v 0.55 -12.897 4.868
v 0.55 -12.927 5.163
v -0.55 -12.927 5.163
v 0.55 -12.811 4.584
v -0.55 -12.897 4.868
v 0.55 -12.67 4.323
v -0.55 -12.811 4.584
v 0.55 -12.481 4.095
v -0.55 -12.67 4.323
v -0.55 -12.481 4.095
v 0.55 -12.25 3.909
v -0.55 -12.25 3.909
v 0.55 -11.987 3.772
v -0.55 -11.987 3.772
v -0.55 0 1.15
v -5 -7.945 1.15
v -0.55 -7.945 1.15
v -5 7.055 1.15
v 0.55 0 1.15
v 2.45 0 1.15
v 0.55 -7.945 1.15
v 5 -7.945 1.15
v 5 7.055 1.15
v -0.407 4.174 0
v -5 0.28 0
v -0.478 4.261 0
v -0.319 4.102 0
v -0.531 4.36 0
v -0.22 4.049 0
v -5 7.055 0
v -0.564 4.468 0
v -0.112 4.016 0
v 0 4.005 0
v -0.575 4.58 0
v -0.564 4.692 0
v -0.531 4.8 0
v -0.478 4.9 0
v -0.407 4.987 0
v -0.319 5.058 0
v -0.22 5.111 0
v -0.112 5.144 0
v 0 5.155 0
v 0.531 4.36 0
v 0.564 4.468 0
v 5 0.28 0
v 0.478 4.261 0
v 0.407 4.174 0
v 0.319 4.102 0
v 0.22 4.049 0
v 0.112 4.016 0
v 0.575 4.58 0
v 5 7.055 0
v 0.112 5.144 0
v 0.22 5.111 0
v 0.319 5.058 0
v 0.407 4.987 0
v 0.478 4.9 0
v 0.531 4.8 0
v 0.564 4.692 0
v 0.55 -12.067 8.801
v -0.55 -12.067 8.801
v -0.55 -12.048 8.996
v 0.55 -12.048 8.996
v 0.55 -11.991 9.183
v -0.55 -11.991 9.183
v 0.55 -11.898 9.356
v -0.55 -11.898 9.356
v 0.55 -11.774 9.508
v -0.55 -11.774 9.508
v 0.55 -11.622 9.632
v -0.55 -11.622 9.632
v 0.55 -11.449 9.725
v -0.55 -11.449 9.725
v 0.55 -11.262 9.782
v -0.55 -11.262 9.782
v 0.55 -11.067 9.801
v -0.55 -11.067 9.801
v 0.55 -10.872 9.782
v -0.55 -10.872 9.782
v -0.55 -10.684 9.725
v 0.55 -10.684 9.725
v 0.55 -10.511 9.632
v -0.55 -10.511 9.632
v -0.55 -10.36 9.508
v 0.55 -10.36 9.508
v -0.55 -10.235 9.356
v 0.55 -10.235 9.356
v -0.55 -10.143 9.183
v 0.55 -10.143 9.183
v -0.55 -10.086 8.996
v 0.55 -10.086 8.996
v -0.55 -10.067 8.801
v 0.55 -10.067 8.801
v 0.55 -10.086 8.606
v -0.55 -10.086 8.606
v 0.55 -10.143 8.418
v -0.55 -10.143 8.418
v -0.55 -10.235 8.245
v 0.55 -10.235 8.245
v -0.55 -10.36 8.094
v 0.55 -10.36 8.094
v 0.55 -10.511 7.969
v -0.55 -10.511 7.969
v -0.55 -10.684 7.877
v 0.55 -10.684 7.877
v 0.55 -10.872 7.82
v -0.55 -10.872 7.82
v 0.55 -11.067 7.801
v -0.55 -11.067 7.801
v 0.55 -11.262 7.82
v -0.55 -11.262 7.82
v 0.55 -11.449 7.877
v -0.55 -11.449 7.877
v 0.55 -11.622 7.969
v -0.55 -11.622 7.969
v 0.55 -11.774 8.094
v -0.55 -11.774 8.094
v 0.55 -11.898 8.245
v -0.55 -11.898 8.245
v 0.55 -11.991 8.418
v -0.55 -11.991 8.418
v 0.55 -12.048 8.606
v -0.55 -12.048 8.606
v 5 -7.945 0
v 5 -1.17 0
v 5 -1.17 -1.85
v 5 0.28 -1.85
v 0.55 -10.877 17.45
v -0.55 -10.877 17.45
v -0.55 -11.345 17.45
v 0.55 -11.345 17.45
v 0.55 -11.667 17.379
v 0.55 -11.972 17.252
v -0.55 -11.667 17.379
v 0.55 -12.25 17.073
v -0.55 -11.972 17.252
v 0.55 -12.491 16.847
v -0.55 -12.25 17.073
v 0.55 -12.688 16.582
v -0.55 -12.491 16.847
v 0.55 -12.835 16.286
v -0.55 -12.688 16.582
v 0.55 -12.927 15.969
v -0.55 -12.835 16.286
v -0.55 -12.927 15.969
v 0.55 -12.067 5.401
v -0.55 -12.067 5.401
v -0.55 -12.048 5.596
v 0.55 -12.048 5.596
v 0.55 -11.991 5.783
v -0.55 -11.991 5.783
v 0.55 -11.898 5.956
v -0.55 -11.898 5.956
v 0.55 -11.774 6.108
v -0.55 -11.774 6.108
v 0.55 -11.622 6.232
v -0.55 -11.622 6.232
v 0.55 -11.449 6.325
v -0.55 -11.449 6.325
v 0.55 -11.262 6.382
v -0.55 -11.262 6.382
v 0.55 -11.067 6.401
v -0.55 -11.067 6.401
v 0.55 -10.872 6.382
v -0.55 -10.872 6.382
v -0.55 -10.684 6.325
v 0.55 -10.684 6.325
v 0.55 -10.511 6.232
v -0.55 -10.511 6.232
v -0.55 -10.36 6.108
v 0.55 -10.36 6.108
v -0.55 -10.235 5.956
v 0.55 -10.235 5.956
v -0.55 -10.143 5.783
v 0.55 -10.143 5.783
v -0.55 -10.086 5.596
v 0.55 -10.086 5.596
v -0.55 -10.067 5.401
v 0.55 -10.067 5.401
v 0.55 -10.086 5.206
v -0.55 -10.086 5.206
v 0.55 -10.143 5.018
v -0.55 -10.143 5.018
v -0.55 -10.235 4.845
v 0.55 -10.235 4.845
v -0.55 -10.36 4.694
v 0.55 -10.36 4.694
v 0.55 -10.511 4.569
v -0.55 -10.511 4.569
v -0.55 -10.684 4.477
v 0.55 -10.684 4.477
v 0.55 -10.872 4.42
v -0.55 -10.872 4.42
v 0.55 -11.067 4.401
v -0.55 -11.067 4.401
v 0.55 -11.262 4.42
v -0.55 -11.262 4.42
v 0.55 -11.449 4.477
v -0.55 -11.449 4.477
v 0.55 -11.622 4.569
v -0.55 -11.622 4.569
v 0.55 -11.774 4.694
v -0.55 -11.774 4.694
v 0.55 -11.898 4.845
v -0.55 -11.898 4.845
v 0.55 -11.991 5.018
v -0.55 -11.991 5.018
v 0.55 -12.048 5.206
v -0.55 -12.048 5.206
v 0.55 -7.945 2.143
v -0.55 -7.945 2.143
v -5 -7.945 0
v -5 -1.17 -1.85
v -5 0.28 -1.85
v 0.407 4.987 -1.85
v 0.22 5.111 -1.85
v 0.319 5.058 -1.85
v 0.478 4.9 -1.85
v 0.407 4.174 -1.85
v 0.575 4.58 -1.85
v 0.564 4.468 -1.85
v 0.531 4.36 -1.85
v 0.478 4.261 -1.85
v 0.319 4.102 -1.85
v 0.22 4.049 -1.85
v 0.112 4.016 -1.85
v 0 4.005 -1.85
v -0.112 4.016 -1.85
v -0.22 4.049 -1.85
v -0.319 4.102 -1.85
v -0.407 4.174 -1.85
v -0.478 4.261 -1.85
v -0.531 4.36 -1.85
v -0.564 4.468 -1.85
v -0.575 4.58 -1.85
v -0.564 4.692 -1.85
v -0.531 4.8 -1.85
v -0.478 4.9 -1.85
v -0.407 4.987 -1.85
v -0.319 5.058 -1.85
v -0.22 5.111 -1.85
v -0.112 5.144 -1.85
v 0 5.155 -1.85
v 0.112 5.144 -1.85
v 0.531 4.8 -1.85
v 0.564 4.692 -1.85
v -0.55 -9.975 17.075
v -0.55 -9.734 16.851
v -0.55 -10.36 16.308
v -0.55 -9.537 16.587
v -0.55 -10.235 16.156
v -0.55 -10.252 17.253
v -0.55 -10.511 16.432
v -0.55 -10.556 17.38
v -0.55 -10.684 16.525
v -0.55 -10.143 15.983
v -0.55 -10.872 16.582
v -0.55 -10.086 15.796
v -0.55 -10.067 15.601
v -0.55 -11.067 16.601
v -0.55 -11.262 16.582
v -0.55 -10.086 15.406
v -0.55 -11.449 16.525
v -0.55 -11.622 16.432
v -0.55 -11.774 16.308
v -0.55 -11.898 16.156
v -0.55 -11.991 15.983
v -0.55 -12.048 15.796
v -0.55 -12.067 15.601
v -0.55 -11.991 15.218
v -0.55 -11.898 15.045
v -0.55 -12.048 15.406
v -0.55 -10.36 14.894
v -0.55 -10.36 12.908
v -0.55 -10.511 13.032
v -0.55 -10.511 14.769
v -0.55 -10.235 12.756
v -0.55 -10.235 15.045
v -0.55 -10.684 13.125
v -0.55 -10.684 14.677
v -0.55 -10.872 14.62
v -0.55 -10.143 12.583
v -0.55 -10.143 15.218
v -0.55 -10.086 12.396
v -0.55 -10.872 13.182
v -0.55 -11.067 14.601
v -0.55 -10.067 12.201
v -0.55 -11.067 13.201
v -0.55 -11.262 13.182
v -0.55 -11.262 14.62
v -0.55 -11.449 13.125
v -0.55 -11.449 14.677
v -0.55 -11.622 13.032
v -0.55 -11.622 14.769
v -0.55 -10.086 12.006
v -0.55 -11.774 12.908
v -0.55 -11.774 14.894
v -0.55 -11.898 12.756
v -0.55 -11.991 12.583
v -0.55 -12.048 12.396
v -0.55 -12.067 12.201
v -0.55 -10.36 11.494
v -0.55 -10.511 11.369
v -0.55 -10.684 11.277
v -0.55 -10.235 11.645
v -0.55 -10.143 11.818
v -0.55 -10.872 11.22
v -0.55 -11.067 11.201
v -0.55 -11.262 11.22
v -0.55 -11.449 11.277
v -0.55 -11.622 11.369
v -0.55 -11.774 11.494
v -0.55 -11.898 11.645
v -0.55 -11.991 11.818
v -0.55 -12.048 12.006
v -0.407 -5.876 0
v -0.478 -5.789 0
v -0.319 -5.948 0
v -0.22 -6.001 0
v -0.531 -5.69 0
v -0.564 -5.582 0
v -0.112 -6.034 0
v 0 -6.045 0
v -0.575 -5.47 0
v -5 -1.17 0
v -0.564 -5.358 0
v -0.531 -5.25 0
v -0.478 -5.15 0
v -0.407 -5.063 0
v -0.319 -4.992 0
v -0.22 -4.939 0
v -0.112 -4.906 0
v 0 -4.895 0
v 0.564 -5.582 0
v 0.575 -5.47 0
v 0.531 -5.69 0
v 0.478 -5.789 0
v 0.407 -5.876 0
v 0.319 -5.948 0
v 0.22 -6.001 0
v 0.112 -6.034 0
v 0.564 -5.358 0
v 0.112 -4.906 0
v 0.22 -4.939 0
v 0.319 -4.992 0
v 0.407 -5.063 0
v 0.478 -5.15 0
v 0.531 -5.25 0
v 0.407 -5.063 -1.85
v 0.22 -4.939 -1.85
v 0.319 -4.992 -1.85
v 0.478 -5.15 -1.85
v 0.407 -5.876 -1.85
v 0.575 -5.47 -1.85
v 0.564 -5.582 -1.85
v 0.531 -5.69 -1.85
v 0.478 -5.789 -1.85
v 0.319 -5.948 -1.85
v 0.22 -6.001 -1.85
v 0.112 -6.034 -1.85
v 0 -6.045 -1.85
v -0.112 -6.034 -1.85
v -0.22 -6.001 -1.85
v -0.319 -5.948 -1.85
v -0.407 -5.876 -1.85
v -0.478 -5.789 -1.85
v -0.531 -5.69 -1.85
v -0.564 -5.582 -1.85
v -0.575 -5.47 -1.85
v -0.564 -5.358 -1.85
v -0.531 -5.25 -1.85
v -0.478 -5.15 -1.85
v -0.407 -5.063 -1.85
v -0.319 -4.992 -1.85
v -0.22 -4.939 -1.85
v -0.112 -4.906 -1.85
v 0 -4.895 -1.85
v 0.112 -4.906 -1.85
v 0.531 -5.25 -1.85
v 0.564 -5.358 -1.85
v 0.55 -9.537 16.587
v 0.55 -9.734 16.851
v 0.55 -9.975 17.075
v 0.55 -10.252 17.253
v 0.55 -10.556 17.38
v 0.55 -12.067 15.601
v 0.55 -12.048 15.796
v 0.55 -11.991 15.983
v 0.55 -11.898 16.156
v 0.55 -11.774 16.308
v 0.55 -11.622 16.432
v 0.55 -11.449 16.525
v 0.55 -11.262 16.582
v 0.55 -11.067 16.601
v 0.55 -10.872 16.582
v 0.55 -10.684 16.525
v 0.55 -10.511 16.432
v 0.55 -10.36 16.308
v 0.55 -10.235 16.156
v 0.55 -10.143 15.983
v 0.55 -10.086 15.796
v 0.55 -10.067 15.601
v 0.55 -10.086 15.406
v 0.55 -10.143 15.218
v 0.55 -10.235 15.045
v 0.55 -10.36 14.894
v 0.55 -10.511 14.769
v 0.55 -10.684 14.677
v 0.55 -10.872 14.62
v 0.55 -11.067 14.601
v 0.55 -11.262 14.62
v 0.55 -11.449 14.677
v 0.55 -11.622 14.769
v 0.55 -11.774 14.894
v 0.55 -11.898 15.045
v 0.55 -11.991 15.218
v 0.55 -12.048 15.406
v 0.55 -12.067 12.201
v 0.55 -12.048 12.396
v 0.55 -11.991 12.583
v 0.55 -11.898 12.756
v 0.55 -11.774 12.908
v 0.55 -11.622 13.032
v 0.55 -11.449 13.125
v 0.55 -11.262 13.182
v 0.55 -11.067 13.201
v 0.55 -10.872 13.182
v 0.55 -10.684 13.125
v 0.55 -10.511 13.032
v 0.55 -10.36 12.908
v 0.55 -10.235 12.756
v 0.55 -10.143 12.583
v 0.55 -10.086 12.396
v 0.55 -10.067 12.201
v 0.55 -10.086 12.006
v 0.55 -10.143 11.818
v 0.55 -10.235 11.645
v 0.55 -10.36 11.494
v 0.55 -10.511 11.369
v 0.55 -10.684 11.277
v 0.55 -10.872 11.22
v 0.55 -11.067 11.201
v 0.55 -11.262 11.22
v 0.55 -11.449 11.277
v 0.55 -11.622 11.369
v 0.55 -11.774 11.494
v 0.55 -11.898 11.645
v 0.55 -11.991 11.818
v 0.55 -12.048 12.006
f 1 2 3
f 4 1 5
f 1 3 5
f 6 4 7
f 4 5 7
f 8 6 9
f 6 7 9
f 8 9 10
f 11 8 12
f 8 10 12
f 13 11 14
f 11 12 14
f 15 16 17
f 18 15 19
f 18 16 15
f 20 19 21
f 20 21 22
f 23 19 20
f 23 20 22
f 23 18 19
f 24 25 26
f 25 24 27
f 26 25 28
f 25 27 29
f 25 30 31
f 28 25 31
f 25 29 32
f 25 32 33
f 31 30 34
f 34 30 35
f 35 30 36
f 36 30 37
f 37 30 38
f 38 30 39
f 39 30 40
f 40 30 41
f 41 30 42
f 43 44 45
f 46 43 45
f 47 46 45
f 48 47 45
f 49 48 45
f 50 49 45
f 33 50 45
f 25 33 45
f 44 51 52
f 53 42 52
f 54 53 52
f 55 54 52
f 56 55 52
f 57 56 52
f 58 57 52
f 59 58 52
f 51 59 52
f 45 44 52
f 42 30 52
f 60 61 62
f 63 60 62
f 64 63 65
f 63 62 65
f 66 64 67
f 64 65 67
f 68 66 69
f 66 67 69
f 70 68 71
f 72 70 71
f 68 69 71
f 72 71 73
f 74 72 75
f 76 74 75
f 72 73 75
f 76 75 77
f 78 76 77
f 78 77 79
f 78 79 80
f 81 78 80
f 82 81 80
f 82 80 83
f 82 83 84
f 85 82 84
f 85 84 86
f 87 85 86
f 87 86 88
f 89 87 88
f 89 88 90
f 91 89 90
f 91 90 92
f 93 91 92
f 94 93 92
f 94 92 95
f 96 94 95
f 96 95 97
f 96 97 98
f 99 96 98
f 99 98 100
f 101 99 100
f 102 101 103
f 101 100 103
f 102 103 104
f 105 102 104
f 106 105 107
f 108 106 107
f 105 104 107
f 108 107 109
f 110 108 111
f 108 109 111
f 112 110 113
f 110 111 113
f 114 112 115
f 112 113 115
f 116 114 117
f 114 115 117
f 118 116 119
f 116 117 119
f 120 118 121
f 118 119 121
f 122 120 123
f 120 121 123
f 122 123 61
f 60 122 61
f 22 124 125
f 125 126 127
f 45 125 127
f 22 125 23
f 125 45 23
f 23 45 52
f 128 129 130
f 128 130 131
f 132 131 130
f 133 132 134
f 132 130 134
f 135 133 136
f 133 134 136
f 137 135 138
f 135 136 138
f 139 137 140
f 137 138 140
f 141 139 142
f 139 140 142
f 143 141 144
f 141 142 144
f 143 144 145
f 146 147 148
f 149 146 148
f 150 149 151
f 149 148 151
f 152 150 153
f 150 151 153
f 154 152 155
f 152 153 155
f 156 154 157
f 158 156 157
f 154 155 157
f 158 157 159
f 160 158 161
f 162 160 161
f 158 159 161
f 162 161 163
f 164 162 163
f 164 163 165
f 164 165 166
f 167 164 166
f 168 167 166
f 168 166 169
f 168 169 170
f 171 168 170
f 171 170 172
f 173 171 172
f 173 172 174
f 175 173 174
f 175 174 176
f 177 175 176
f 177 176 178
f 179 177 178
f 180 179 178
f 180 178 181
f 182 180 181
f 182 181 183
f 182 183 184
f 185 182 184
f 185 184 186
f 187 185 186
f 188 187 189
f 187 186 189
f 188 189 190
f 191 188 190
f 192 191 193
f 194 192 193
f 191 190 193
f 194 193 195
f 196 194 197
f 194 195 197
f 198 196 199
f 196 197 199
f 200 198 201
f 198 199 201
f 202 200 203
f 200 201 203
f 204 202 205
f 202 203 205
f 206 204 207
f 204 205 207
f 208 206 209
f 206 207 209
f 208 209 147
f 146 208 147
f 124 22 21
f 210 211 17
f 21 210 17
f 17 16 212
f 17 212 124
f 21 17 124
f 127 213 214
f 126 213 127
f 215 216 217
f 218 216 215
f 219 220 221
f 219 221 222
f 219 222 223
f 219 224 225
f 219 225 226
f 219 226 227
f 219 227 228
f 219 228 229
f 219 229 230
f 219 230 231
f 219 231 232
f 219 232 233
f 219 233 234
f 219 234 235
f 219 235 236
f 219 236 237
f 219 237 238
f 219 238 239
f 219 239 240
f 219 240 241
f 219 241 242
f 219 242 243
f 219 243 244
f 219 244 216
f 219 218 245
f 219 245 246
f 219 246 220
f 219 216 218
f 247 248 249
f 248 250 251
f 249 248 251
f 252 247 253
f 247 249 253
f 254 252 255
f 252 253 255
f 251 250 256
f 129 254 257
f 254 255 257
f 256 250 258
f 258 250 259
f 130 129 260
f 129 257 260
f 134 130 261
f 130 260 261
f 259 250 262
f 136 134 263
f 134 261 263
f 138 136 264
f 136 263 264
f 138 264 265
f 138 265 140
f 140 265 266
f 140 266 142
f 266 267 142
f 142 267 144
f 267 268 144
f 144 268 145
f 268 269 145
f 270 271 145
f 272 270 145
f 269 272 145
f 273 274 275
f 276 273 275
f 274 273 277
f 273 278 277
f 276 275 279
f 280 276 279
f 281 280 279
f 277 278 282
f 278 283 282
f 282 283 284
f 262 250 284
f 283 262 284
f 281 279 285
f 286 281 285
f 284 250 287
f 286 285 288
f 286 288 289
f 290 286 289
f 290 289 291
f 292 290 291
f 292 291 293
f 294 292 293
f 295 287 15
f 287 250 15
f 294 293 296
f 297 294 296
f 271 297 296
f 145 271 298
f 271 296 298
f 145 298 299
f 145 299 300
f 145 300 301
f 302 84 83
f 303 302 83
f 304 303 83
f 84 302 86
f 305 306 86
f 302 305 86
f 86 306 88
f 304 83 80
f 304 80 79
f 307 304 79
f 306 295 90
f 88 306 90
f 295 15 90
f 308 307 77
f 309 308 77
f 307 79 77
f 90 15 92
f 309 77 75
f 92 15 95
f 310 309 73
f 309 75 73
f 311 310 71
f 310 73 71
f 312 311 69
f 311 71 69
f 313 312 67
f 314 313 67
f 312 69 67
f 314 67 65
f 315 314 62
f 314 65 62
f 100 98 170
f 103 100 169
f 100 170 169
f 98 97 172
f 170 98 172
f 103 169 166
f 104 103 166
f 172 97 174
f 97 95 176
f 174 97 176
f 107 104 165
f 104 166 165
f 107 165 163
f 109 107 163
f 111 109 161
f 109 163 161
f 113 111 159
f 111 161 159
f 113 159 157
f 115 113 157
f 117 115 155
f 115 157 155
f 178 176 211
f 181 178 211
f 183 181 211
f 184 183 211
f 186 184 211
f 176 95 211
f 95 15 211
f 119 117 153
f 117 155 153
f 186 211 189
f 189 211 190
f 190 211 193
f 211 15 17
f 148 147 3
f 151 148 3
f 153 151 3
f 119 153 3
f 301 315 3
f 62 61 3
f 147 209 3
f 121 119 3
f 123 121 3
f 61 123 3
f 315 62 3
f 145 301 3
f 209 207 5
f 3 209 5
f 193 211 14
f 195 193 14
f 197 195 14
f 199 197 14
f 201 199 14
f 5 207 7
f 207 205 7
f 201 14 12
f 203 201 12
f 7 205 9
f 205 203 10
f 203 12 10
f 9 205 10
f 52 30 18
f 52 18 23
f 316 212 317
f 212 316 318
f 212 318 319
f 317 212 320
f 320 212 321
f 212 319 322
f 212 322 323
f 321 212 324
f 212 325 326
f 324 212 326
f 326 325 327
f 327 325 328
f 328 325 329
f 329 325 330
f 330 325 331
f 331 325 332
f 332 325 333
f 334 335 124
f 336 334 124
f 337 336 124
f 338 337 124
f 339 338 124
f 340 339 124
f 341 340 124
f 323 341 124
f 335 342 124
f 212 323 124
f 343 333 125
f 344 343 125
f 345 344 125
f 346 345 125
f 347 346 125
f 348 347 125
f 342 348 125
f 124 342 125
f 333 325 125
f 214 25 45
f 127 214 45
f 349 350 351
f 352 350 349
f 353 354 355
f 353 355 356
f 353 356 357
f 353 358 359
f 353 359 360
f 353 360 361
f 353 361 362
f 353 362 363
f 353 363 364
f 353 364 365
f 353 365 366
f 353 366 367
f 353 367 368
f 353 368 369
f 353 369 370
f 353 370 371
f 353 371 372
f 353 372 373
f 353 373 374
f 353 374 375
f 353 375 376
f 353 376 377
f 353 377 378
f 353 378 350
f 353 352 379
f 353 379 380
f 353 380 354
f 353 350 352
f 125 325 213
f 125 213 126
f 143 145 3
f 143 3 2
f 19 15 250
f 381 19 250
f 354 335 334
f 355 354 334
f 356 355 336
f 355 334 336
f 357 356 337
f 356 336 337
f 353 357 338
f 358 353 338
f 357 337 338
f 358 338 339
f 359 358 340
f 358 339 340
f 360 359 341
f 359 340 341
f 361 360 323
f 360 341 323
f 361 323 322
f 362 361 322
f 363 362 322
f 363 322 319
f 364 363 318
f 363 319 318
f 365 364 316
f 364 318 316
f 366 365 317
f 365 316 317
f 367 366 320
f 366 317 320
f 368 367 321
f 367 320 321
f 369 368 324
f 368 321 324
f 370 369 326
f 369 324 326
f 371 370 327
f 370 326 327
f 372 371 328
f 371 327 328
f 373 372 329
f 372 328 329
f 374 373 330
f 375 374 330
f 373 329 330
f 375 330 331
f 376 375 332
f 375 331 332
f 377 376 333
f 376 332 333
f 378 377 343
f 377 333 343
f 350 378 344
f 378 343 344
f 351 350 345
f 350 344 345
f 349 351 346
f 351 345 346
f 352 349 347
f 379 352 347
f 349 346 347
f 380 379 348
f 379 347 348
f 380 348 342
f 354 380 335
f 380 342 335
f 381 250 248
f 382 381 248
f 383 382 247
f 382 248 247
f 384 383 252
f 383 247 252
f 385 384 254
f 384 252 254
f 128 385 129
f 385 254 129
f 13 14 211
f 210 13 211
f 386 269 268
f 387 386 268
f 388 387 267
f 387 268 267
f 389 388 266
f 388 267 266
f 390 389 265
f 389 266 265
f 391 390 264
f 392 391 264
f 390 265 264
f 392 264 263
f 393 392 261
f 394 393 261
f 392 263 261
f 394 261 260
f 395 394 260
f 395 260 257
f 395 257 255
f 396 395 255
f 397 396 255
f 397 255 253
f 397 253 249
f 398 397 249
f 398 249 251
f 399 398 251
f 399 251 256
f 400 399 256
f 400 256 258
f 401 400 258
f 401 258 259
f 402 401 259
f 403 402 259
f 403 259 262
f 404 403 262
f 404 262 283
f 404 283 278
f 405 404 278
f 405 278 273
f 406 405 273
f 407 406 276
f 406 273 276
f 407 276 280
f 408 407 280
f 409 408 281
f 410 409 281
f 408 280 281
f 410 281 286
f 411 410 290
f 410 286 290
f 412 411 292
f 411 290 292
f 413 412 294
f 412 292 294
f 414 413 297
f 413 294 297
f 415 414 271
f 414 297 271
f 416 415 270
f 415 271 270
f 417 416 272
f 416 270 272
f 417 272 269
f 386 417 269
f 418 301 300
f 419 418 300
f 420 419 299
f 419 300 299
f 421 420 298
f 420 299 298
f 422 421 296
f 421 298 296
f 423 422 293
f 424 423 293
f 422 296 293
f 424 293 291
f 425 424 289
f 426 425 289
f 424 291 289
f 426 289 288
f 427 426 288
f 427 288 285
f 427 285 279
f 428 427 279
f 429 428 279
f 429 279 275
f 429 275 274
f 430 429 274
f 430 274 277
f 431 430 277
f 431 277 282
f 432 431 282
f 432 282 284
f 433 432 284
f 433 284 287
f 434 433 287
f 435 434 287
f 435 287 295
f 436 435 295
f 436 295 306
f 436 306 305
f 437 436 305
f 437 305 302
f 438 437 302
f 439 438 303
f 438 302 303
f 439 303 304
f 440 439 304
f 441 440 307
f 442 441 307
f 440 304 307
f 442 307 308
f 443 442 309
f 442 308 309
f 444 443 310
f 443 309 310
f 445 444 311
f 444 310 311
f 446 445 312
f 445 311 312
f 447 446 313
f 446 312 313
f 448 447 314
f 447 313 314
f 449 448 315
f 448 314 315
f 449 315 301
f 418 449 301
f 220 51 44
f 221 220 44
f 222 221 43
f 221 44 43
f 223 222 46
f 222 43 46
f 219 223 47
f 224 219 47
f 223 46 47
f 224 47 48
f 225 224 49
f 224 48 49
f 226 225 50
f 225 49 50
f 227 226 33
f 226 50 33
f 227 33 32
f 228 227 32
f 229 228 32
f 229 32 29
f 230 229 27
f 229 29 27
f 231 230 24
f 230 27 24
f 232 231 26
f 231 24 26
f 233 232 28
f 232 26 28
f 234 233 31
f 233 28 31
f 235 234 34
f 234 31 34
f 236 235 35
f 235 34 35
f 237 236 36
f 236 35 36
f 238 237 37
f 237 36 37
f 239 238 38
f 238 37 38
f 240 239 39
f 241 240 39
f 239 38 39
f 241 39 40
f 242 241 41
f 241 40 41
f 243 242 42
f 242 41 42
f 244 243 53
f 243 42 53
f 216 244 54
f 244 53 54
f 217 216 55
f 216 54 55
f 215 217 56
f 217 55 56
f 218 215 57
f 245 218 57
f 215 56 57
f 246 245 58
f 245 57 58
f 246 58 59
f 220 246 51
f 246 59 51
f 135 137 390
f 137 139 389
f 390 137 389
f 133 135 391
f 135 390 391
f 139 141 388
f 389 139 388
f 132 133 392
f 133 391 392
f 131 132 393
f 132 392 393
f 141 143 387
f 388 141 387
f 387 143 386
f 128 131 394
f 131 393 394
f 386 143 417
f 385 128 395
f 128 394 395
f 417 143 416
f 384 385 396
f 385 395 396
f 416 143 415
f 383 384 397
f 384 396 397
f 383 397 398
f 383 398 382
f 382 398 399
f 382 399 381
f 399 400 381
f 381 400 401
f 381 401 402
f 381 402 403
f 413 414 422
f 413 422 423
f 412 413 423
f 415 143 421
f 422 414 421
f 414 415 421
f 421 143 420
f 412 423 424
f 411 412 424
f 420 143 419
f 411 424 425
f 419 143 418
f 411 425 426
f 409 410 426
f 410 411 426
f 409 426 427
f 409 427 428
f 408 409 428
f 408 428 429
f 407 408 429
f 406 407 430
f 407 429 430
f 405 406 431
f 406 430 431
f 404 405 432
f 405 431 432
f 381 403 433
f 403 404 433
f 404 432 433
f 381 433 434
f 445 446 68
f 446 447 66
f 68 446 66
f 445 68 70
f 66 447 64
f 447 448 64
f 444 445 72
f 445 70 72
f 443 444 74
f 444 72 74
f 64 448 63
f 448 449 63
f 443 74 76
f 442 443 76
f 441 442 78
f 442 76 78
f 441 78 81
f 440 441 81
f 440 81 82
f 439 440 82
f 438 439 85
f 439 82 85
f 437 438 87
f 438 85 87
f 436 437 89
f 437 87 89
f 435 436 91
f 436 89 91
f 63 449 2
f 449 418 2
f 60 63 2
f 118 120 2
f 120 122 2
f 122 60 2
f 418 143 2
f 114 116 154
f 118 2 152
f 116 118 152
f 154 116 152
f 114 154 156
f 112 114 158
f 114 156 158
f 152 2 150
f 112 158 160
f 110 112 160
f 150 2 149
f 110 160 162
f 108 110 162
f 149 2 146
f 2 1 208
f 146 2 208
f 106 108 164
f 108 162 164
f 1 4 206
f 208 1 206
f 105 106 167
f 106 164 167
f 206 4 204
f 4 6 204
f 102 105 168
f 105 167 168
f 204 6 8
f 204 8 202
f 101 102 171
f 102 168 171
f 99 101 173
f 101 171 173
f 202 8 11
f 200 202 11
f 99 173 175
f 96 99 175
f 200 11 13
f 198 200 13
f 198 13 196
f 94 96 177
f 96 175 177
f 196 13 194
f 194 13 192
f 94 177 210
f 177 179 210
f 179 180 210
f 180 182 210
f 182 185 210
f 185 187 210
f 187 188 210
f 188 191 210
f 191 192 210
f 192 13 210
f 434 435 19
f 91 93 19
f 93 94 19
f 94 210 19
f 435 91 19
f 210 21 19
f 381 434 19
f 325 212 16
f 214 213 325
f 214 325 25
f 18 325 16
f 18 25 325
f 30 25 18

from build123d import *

# Parameters (mm, degrees)
F0_W     = 10
F0_H     = 15
F1_DEPTH = 1.15
F2_W     = 10
F2_H     = 1.45
F2_R     = 0.575
F3_DEPTH = 1.85
F5_W     = 1.0999371812
F5_H     = 4.9819686796
F5_H_2   = 7.9447921516
F6_DEPTH = 16.3
F7_R     = 1
F8_DEPTH = 3


with BuildPart() as f1:
    # F0 (on Top) → F1 (new body)
    with BuildSketch(Plane.XY):
        with Locations((4.657e-07, -0.4447921516)):
            Rectangle(F0_W, F0_H)
    extrude(amount=F1_DEPTH)

    # F2 (on face) → F3 (join)
    with BuildSketch(Plane(origin=(0, 0, 0), x_dir=(1, 0, 0), z_dir=(0, 0, -1))):
        with Locations((4.657e-07, 0.4447921516)):
            Rectangle(F2_W, F2_H)
        with Locations((4.657e-07, -4.5802078484)):
            Circle(F2_R)
        with Locations((4.657e-07, 5.4697921516)):
            Circle(F2_R)
    extrude(amount=F3_DEPTH)

    # F5 (on face) → F6 (join)
    with BuildSketch(Plane.XY.offset(1.15)):
        with Locations((-3.14094e-05, -10.4357764914)):
            Rectangle(F5_W, F5_H)
        with Locations((-3.14094e-05, -3.9723960758)):
            Rectangle(F5_W, F5_H_2)
    extrude(amount=F6_DEPTH)

    # F7 (on face) → F8 (cut)
    with BuildSketch(Plane(origin=(-0.55, 0, 0), x_dir=(0, -1, 0), z_dir=(-1, 0, 0))):
        with BuildLine():
            Line((0, 17.45), (0, 1.15))
            Line((0, 1.15), (9.5370645307, 16.5871438408))
            ThreePointArc((9.5370645307, 16.5871438408), (10.109500032, 17.170324419), (10.8773304556, 17.45))
            Line((10.8773304556, 17.45), (0, 17.45))
        make_face()
        with BuildLine():
            Line((12.9267608312, 17.45), (11.3445362076, 17.45))
            ThreePointArc((11.3445362076, 17.45), (12.375279512, 16.9653370525), (12.9267608312, 15.9687437117))
            Line((12.9267608312, 15.9687437117), (12.9267608312, 17.45))
        make_face()
        with Locations((11.0667608312, 15.6007357099)):
            Circle(F7_R)
        with Locations((11.0667608312, 12.2007357099)):
            Circle(F7_R)
        with Locations((11.0667608312, 8.8007357099)):
            Circle(F7_R)
        with Locations((11.0667608312, 5.4007357099)):
            Circle(F7_R)
        with BuildLine():
            Line((7.9447921516, 2.1431122441), (7.9447921516, 1.15))
            Line((7.9447921516, 1.15), (12.9267608312, 1.15))
            Line((12.9267608312, 1.15), (12.9267608312, 4.15))
            Line((12.9267608312, 4.15), (12.9267608312, 5.1628855511))
            ThreePointArc((12.9267608312, 5.1628855511), (12.6698856531, 4.3234567709), (11.9872399284, 3.7715325472))
            Line((11.9872399284, 3.7715325472), (7.9447921516, 2.1431122441))
        make_face()
    extrude(amount=-F8_DEPTH, mode=Mode.SUBTRACT)


solid = f1.part
